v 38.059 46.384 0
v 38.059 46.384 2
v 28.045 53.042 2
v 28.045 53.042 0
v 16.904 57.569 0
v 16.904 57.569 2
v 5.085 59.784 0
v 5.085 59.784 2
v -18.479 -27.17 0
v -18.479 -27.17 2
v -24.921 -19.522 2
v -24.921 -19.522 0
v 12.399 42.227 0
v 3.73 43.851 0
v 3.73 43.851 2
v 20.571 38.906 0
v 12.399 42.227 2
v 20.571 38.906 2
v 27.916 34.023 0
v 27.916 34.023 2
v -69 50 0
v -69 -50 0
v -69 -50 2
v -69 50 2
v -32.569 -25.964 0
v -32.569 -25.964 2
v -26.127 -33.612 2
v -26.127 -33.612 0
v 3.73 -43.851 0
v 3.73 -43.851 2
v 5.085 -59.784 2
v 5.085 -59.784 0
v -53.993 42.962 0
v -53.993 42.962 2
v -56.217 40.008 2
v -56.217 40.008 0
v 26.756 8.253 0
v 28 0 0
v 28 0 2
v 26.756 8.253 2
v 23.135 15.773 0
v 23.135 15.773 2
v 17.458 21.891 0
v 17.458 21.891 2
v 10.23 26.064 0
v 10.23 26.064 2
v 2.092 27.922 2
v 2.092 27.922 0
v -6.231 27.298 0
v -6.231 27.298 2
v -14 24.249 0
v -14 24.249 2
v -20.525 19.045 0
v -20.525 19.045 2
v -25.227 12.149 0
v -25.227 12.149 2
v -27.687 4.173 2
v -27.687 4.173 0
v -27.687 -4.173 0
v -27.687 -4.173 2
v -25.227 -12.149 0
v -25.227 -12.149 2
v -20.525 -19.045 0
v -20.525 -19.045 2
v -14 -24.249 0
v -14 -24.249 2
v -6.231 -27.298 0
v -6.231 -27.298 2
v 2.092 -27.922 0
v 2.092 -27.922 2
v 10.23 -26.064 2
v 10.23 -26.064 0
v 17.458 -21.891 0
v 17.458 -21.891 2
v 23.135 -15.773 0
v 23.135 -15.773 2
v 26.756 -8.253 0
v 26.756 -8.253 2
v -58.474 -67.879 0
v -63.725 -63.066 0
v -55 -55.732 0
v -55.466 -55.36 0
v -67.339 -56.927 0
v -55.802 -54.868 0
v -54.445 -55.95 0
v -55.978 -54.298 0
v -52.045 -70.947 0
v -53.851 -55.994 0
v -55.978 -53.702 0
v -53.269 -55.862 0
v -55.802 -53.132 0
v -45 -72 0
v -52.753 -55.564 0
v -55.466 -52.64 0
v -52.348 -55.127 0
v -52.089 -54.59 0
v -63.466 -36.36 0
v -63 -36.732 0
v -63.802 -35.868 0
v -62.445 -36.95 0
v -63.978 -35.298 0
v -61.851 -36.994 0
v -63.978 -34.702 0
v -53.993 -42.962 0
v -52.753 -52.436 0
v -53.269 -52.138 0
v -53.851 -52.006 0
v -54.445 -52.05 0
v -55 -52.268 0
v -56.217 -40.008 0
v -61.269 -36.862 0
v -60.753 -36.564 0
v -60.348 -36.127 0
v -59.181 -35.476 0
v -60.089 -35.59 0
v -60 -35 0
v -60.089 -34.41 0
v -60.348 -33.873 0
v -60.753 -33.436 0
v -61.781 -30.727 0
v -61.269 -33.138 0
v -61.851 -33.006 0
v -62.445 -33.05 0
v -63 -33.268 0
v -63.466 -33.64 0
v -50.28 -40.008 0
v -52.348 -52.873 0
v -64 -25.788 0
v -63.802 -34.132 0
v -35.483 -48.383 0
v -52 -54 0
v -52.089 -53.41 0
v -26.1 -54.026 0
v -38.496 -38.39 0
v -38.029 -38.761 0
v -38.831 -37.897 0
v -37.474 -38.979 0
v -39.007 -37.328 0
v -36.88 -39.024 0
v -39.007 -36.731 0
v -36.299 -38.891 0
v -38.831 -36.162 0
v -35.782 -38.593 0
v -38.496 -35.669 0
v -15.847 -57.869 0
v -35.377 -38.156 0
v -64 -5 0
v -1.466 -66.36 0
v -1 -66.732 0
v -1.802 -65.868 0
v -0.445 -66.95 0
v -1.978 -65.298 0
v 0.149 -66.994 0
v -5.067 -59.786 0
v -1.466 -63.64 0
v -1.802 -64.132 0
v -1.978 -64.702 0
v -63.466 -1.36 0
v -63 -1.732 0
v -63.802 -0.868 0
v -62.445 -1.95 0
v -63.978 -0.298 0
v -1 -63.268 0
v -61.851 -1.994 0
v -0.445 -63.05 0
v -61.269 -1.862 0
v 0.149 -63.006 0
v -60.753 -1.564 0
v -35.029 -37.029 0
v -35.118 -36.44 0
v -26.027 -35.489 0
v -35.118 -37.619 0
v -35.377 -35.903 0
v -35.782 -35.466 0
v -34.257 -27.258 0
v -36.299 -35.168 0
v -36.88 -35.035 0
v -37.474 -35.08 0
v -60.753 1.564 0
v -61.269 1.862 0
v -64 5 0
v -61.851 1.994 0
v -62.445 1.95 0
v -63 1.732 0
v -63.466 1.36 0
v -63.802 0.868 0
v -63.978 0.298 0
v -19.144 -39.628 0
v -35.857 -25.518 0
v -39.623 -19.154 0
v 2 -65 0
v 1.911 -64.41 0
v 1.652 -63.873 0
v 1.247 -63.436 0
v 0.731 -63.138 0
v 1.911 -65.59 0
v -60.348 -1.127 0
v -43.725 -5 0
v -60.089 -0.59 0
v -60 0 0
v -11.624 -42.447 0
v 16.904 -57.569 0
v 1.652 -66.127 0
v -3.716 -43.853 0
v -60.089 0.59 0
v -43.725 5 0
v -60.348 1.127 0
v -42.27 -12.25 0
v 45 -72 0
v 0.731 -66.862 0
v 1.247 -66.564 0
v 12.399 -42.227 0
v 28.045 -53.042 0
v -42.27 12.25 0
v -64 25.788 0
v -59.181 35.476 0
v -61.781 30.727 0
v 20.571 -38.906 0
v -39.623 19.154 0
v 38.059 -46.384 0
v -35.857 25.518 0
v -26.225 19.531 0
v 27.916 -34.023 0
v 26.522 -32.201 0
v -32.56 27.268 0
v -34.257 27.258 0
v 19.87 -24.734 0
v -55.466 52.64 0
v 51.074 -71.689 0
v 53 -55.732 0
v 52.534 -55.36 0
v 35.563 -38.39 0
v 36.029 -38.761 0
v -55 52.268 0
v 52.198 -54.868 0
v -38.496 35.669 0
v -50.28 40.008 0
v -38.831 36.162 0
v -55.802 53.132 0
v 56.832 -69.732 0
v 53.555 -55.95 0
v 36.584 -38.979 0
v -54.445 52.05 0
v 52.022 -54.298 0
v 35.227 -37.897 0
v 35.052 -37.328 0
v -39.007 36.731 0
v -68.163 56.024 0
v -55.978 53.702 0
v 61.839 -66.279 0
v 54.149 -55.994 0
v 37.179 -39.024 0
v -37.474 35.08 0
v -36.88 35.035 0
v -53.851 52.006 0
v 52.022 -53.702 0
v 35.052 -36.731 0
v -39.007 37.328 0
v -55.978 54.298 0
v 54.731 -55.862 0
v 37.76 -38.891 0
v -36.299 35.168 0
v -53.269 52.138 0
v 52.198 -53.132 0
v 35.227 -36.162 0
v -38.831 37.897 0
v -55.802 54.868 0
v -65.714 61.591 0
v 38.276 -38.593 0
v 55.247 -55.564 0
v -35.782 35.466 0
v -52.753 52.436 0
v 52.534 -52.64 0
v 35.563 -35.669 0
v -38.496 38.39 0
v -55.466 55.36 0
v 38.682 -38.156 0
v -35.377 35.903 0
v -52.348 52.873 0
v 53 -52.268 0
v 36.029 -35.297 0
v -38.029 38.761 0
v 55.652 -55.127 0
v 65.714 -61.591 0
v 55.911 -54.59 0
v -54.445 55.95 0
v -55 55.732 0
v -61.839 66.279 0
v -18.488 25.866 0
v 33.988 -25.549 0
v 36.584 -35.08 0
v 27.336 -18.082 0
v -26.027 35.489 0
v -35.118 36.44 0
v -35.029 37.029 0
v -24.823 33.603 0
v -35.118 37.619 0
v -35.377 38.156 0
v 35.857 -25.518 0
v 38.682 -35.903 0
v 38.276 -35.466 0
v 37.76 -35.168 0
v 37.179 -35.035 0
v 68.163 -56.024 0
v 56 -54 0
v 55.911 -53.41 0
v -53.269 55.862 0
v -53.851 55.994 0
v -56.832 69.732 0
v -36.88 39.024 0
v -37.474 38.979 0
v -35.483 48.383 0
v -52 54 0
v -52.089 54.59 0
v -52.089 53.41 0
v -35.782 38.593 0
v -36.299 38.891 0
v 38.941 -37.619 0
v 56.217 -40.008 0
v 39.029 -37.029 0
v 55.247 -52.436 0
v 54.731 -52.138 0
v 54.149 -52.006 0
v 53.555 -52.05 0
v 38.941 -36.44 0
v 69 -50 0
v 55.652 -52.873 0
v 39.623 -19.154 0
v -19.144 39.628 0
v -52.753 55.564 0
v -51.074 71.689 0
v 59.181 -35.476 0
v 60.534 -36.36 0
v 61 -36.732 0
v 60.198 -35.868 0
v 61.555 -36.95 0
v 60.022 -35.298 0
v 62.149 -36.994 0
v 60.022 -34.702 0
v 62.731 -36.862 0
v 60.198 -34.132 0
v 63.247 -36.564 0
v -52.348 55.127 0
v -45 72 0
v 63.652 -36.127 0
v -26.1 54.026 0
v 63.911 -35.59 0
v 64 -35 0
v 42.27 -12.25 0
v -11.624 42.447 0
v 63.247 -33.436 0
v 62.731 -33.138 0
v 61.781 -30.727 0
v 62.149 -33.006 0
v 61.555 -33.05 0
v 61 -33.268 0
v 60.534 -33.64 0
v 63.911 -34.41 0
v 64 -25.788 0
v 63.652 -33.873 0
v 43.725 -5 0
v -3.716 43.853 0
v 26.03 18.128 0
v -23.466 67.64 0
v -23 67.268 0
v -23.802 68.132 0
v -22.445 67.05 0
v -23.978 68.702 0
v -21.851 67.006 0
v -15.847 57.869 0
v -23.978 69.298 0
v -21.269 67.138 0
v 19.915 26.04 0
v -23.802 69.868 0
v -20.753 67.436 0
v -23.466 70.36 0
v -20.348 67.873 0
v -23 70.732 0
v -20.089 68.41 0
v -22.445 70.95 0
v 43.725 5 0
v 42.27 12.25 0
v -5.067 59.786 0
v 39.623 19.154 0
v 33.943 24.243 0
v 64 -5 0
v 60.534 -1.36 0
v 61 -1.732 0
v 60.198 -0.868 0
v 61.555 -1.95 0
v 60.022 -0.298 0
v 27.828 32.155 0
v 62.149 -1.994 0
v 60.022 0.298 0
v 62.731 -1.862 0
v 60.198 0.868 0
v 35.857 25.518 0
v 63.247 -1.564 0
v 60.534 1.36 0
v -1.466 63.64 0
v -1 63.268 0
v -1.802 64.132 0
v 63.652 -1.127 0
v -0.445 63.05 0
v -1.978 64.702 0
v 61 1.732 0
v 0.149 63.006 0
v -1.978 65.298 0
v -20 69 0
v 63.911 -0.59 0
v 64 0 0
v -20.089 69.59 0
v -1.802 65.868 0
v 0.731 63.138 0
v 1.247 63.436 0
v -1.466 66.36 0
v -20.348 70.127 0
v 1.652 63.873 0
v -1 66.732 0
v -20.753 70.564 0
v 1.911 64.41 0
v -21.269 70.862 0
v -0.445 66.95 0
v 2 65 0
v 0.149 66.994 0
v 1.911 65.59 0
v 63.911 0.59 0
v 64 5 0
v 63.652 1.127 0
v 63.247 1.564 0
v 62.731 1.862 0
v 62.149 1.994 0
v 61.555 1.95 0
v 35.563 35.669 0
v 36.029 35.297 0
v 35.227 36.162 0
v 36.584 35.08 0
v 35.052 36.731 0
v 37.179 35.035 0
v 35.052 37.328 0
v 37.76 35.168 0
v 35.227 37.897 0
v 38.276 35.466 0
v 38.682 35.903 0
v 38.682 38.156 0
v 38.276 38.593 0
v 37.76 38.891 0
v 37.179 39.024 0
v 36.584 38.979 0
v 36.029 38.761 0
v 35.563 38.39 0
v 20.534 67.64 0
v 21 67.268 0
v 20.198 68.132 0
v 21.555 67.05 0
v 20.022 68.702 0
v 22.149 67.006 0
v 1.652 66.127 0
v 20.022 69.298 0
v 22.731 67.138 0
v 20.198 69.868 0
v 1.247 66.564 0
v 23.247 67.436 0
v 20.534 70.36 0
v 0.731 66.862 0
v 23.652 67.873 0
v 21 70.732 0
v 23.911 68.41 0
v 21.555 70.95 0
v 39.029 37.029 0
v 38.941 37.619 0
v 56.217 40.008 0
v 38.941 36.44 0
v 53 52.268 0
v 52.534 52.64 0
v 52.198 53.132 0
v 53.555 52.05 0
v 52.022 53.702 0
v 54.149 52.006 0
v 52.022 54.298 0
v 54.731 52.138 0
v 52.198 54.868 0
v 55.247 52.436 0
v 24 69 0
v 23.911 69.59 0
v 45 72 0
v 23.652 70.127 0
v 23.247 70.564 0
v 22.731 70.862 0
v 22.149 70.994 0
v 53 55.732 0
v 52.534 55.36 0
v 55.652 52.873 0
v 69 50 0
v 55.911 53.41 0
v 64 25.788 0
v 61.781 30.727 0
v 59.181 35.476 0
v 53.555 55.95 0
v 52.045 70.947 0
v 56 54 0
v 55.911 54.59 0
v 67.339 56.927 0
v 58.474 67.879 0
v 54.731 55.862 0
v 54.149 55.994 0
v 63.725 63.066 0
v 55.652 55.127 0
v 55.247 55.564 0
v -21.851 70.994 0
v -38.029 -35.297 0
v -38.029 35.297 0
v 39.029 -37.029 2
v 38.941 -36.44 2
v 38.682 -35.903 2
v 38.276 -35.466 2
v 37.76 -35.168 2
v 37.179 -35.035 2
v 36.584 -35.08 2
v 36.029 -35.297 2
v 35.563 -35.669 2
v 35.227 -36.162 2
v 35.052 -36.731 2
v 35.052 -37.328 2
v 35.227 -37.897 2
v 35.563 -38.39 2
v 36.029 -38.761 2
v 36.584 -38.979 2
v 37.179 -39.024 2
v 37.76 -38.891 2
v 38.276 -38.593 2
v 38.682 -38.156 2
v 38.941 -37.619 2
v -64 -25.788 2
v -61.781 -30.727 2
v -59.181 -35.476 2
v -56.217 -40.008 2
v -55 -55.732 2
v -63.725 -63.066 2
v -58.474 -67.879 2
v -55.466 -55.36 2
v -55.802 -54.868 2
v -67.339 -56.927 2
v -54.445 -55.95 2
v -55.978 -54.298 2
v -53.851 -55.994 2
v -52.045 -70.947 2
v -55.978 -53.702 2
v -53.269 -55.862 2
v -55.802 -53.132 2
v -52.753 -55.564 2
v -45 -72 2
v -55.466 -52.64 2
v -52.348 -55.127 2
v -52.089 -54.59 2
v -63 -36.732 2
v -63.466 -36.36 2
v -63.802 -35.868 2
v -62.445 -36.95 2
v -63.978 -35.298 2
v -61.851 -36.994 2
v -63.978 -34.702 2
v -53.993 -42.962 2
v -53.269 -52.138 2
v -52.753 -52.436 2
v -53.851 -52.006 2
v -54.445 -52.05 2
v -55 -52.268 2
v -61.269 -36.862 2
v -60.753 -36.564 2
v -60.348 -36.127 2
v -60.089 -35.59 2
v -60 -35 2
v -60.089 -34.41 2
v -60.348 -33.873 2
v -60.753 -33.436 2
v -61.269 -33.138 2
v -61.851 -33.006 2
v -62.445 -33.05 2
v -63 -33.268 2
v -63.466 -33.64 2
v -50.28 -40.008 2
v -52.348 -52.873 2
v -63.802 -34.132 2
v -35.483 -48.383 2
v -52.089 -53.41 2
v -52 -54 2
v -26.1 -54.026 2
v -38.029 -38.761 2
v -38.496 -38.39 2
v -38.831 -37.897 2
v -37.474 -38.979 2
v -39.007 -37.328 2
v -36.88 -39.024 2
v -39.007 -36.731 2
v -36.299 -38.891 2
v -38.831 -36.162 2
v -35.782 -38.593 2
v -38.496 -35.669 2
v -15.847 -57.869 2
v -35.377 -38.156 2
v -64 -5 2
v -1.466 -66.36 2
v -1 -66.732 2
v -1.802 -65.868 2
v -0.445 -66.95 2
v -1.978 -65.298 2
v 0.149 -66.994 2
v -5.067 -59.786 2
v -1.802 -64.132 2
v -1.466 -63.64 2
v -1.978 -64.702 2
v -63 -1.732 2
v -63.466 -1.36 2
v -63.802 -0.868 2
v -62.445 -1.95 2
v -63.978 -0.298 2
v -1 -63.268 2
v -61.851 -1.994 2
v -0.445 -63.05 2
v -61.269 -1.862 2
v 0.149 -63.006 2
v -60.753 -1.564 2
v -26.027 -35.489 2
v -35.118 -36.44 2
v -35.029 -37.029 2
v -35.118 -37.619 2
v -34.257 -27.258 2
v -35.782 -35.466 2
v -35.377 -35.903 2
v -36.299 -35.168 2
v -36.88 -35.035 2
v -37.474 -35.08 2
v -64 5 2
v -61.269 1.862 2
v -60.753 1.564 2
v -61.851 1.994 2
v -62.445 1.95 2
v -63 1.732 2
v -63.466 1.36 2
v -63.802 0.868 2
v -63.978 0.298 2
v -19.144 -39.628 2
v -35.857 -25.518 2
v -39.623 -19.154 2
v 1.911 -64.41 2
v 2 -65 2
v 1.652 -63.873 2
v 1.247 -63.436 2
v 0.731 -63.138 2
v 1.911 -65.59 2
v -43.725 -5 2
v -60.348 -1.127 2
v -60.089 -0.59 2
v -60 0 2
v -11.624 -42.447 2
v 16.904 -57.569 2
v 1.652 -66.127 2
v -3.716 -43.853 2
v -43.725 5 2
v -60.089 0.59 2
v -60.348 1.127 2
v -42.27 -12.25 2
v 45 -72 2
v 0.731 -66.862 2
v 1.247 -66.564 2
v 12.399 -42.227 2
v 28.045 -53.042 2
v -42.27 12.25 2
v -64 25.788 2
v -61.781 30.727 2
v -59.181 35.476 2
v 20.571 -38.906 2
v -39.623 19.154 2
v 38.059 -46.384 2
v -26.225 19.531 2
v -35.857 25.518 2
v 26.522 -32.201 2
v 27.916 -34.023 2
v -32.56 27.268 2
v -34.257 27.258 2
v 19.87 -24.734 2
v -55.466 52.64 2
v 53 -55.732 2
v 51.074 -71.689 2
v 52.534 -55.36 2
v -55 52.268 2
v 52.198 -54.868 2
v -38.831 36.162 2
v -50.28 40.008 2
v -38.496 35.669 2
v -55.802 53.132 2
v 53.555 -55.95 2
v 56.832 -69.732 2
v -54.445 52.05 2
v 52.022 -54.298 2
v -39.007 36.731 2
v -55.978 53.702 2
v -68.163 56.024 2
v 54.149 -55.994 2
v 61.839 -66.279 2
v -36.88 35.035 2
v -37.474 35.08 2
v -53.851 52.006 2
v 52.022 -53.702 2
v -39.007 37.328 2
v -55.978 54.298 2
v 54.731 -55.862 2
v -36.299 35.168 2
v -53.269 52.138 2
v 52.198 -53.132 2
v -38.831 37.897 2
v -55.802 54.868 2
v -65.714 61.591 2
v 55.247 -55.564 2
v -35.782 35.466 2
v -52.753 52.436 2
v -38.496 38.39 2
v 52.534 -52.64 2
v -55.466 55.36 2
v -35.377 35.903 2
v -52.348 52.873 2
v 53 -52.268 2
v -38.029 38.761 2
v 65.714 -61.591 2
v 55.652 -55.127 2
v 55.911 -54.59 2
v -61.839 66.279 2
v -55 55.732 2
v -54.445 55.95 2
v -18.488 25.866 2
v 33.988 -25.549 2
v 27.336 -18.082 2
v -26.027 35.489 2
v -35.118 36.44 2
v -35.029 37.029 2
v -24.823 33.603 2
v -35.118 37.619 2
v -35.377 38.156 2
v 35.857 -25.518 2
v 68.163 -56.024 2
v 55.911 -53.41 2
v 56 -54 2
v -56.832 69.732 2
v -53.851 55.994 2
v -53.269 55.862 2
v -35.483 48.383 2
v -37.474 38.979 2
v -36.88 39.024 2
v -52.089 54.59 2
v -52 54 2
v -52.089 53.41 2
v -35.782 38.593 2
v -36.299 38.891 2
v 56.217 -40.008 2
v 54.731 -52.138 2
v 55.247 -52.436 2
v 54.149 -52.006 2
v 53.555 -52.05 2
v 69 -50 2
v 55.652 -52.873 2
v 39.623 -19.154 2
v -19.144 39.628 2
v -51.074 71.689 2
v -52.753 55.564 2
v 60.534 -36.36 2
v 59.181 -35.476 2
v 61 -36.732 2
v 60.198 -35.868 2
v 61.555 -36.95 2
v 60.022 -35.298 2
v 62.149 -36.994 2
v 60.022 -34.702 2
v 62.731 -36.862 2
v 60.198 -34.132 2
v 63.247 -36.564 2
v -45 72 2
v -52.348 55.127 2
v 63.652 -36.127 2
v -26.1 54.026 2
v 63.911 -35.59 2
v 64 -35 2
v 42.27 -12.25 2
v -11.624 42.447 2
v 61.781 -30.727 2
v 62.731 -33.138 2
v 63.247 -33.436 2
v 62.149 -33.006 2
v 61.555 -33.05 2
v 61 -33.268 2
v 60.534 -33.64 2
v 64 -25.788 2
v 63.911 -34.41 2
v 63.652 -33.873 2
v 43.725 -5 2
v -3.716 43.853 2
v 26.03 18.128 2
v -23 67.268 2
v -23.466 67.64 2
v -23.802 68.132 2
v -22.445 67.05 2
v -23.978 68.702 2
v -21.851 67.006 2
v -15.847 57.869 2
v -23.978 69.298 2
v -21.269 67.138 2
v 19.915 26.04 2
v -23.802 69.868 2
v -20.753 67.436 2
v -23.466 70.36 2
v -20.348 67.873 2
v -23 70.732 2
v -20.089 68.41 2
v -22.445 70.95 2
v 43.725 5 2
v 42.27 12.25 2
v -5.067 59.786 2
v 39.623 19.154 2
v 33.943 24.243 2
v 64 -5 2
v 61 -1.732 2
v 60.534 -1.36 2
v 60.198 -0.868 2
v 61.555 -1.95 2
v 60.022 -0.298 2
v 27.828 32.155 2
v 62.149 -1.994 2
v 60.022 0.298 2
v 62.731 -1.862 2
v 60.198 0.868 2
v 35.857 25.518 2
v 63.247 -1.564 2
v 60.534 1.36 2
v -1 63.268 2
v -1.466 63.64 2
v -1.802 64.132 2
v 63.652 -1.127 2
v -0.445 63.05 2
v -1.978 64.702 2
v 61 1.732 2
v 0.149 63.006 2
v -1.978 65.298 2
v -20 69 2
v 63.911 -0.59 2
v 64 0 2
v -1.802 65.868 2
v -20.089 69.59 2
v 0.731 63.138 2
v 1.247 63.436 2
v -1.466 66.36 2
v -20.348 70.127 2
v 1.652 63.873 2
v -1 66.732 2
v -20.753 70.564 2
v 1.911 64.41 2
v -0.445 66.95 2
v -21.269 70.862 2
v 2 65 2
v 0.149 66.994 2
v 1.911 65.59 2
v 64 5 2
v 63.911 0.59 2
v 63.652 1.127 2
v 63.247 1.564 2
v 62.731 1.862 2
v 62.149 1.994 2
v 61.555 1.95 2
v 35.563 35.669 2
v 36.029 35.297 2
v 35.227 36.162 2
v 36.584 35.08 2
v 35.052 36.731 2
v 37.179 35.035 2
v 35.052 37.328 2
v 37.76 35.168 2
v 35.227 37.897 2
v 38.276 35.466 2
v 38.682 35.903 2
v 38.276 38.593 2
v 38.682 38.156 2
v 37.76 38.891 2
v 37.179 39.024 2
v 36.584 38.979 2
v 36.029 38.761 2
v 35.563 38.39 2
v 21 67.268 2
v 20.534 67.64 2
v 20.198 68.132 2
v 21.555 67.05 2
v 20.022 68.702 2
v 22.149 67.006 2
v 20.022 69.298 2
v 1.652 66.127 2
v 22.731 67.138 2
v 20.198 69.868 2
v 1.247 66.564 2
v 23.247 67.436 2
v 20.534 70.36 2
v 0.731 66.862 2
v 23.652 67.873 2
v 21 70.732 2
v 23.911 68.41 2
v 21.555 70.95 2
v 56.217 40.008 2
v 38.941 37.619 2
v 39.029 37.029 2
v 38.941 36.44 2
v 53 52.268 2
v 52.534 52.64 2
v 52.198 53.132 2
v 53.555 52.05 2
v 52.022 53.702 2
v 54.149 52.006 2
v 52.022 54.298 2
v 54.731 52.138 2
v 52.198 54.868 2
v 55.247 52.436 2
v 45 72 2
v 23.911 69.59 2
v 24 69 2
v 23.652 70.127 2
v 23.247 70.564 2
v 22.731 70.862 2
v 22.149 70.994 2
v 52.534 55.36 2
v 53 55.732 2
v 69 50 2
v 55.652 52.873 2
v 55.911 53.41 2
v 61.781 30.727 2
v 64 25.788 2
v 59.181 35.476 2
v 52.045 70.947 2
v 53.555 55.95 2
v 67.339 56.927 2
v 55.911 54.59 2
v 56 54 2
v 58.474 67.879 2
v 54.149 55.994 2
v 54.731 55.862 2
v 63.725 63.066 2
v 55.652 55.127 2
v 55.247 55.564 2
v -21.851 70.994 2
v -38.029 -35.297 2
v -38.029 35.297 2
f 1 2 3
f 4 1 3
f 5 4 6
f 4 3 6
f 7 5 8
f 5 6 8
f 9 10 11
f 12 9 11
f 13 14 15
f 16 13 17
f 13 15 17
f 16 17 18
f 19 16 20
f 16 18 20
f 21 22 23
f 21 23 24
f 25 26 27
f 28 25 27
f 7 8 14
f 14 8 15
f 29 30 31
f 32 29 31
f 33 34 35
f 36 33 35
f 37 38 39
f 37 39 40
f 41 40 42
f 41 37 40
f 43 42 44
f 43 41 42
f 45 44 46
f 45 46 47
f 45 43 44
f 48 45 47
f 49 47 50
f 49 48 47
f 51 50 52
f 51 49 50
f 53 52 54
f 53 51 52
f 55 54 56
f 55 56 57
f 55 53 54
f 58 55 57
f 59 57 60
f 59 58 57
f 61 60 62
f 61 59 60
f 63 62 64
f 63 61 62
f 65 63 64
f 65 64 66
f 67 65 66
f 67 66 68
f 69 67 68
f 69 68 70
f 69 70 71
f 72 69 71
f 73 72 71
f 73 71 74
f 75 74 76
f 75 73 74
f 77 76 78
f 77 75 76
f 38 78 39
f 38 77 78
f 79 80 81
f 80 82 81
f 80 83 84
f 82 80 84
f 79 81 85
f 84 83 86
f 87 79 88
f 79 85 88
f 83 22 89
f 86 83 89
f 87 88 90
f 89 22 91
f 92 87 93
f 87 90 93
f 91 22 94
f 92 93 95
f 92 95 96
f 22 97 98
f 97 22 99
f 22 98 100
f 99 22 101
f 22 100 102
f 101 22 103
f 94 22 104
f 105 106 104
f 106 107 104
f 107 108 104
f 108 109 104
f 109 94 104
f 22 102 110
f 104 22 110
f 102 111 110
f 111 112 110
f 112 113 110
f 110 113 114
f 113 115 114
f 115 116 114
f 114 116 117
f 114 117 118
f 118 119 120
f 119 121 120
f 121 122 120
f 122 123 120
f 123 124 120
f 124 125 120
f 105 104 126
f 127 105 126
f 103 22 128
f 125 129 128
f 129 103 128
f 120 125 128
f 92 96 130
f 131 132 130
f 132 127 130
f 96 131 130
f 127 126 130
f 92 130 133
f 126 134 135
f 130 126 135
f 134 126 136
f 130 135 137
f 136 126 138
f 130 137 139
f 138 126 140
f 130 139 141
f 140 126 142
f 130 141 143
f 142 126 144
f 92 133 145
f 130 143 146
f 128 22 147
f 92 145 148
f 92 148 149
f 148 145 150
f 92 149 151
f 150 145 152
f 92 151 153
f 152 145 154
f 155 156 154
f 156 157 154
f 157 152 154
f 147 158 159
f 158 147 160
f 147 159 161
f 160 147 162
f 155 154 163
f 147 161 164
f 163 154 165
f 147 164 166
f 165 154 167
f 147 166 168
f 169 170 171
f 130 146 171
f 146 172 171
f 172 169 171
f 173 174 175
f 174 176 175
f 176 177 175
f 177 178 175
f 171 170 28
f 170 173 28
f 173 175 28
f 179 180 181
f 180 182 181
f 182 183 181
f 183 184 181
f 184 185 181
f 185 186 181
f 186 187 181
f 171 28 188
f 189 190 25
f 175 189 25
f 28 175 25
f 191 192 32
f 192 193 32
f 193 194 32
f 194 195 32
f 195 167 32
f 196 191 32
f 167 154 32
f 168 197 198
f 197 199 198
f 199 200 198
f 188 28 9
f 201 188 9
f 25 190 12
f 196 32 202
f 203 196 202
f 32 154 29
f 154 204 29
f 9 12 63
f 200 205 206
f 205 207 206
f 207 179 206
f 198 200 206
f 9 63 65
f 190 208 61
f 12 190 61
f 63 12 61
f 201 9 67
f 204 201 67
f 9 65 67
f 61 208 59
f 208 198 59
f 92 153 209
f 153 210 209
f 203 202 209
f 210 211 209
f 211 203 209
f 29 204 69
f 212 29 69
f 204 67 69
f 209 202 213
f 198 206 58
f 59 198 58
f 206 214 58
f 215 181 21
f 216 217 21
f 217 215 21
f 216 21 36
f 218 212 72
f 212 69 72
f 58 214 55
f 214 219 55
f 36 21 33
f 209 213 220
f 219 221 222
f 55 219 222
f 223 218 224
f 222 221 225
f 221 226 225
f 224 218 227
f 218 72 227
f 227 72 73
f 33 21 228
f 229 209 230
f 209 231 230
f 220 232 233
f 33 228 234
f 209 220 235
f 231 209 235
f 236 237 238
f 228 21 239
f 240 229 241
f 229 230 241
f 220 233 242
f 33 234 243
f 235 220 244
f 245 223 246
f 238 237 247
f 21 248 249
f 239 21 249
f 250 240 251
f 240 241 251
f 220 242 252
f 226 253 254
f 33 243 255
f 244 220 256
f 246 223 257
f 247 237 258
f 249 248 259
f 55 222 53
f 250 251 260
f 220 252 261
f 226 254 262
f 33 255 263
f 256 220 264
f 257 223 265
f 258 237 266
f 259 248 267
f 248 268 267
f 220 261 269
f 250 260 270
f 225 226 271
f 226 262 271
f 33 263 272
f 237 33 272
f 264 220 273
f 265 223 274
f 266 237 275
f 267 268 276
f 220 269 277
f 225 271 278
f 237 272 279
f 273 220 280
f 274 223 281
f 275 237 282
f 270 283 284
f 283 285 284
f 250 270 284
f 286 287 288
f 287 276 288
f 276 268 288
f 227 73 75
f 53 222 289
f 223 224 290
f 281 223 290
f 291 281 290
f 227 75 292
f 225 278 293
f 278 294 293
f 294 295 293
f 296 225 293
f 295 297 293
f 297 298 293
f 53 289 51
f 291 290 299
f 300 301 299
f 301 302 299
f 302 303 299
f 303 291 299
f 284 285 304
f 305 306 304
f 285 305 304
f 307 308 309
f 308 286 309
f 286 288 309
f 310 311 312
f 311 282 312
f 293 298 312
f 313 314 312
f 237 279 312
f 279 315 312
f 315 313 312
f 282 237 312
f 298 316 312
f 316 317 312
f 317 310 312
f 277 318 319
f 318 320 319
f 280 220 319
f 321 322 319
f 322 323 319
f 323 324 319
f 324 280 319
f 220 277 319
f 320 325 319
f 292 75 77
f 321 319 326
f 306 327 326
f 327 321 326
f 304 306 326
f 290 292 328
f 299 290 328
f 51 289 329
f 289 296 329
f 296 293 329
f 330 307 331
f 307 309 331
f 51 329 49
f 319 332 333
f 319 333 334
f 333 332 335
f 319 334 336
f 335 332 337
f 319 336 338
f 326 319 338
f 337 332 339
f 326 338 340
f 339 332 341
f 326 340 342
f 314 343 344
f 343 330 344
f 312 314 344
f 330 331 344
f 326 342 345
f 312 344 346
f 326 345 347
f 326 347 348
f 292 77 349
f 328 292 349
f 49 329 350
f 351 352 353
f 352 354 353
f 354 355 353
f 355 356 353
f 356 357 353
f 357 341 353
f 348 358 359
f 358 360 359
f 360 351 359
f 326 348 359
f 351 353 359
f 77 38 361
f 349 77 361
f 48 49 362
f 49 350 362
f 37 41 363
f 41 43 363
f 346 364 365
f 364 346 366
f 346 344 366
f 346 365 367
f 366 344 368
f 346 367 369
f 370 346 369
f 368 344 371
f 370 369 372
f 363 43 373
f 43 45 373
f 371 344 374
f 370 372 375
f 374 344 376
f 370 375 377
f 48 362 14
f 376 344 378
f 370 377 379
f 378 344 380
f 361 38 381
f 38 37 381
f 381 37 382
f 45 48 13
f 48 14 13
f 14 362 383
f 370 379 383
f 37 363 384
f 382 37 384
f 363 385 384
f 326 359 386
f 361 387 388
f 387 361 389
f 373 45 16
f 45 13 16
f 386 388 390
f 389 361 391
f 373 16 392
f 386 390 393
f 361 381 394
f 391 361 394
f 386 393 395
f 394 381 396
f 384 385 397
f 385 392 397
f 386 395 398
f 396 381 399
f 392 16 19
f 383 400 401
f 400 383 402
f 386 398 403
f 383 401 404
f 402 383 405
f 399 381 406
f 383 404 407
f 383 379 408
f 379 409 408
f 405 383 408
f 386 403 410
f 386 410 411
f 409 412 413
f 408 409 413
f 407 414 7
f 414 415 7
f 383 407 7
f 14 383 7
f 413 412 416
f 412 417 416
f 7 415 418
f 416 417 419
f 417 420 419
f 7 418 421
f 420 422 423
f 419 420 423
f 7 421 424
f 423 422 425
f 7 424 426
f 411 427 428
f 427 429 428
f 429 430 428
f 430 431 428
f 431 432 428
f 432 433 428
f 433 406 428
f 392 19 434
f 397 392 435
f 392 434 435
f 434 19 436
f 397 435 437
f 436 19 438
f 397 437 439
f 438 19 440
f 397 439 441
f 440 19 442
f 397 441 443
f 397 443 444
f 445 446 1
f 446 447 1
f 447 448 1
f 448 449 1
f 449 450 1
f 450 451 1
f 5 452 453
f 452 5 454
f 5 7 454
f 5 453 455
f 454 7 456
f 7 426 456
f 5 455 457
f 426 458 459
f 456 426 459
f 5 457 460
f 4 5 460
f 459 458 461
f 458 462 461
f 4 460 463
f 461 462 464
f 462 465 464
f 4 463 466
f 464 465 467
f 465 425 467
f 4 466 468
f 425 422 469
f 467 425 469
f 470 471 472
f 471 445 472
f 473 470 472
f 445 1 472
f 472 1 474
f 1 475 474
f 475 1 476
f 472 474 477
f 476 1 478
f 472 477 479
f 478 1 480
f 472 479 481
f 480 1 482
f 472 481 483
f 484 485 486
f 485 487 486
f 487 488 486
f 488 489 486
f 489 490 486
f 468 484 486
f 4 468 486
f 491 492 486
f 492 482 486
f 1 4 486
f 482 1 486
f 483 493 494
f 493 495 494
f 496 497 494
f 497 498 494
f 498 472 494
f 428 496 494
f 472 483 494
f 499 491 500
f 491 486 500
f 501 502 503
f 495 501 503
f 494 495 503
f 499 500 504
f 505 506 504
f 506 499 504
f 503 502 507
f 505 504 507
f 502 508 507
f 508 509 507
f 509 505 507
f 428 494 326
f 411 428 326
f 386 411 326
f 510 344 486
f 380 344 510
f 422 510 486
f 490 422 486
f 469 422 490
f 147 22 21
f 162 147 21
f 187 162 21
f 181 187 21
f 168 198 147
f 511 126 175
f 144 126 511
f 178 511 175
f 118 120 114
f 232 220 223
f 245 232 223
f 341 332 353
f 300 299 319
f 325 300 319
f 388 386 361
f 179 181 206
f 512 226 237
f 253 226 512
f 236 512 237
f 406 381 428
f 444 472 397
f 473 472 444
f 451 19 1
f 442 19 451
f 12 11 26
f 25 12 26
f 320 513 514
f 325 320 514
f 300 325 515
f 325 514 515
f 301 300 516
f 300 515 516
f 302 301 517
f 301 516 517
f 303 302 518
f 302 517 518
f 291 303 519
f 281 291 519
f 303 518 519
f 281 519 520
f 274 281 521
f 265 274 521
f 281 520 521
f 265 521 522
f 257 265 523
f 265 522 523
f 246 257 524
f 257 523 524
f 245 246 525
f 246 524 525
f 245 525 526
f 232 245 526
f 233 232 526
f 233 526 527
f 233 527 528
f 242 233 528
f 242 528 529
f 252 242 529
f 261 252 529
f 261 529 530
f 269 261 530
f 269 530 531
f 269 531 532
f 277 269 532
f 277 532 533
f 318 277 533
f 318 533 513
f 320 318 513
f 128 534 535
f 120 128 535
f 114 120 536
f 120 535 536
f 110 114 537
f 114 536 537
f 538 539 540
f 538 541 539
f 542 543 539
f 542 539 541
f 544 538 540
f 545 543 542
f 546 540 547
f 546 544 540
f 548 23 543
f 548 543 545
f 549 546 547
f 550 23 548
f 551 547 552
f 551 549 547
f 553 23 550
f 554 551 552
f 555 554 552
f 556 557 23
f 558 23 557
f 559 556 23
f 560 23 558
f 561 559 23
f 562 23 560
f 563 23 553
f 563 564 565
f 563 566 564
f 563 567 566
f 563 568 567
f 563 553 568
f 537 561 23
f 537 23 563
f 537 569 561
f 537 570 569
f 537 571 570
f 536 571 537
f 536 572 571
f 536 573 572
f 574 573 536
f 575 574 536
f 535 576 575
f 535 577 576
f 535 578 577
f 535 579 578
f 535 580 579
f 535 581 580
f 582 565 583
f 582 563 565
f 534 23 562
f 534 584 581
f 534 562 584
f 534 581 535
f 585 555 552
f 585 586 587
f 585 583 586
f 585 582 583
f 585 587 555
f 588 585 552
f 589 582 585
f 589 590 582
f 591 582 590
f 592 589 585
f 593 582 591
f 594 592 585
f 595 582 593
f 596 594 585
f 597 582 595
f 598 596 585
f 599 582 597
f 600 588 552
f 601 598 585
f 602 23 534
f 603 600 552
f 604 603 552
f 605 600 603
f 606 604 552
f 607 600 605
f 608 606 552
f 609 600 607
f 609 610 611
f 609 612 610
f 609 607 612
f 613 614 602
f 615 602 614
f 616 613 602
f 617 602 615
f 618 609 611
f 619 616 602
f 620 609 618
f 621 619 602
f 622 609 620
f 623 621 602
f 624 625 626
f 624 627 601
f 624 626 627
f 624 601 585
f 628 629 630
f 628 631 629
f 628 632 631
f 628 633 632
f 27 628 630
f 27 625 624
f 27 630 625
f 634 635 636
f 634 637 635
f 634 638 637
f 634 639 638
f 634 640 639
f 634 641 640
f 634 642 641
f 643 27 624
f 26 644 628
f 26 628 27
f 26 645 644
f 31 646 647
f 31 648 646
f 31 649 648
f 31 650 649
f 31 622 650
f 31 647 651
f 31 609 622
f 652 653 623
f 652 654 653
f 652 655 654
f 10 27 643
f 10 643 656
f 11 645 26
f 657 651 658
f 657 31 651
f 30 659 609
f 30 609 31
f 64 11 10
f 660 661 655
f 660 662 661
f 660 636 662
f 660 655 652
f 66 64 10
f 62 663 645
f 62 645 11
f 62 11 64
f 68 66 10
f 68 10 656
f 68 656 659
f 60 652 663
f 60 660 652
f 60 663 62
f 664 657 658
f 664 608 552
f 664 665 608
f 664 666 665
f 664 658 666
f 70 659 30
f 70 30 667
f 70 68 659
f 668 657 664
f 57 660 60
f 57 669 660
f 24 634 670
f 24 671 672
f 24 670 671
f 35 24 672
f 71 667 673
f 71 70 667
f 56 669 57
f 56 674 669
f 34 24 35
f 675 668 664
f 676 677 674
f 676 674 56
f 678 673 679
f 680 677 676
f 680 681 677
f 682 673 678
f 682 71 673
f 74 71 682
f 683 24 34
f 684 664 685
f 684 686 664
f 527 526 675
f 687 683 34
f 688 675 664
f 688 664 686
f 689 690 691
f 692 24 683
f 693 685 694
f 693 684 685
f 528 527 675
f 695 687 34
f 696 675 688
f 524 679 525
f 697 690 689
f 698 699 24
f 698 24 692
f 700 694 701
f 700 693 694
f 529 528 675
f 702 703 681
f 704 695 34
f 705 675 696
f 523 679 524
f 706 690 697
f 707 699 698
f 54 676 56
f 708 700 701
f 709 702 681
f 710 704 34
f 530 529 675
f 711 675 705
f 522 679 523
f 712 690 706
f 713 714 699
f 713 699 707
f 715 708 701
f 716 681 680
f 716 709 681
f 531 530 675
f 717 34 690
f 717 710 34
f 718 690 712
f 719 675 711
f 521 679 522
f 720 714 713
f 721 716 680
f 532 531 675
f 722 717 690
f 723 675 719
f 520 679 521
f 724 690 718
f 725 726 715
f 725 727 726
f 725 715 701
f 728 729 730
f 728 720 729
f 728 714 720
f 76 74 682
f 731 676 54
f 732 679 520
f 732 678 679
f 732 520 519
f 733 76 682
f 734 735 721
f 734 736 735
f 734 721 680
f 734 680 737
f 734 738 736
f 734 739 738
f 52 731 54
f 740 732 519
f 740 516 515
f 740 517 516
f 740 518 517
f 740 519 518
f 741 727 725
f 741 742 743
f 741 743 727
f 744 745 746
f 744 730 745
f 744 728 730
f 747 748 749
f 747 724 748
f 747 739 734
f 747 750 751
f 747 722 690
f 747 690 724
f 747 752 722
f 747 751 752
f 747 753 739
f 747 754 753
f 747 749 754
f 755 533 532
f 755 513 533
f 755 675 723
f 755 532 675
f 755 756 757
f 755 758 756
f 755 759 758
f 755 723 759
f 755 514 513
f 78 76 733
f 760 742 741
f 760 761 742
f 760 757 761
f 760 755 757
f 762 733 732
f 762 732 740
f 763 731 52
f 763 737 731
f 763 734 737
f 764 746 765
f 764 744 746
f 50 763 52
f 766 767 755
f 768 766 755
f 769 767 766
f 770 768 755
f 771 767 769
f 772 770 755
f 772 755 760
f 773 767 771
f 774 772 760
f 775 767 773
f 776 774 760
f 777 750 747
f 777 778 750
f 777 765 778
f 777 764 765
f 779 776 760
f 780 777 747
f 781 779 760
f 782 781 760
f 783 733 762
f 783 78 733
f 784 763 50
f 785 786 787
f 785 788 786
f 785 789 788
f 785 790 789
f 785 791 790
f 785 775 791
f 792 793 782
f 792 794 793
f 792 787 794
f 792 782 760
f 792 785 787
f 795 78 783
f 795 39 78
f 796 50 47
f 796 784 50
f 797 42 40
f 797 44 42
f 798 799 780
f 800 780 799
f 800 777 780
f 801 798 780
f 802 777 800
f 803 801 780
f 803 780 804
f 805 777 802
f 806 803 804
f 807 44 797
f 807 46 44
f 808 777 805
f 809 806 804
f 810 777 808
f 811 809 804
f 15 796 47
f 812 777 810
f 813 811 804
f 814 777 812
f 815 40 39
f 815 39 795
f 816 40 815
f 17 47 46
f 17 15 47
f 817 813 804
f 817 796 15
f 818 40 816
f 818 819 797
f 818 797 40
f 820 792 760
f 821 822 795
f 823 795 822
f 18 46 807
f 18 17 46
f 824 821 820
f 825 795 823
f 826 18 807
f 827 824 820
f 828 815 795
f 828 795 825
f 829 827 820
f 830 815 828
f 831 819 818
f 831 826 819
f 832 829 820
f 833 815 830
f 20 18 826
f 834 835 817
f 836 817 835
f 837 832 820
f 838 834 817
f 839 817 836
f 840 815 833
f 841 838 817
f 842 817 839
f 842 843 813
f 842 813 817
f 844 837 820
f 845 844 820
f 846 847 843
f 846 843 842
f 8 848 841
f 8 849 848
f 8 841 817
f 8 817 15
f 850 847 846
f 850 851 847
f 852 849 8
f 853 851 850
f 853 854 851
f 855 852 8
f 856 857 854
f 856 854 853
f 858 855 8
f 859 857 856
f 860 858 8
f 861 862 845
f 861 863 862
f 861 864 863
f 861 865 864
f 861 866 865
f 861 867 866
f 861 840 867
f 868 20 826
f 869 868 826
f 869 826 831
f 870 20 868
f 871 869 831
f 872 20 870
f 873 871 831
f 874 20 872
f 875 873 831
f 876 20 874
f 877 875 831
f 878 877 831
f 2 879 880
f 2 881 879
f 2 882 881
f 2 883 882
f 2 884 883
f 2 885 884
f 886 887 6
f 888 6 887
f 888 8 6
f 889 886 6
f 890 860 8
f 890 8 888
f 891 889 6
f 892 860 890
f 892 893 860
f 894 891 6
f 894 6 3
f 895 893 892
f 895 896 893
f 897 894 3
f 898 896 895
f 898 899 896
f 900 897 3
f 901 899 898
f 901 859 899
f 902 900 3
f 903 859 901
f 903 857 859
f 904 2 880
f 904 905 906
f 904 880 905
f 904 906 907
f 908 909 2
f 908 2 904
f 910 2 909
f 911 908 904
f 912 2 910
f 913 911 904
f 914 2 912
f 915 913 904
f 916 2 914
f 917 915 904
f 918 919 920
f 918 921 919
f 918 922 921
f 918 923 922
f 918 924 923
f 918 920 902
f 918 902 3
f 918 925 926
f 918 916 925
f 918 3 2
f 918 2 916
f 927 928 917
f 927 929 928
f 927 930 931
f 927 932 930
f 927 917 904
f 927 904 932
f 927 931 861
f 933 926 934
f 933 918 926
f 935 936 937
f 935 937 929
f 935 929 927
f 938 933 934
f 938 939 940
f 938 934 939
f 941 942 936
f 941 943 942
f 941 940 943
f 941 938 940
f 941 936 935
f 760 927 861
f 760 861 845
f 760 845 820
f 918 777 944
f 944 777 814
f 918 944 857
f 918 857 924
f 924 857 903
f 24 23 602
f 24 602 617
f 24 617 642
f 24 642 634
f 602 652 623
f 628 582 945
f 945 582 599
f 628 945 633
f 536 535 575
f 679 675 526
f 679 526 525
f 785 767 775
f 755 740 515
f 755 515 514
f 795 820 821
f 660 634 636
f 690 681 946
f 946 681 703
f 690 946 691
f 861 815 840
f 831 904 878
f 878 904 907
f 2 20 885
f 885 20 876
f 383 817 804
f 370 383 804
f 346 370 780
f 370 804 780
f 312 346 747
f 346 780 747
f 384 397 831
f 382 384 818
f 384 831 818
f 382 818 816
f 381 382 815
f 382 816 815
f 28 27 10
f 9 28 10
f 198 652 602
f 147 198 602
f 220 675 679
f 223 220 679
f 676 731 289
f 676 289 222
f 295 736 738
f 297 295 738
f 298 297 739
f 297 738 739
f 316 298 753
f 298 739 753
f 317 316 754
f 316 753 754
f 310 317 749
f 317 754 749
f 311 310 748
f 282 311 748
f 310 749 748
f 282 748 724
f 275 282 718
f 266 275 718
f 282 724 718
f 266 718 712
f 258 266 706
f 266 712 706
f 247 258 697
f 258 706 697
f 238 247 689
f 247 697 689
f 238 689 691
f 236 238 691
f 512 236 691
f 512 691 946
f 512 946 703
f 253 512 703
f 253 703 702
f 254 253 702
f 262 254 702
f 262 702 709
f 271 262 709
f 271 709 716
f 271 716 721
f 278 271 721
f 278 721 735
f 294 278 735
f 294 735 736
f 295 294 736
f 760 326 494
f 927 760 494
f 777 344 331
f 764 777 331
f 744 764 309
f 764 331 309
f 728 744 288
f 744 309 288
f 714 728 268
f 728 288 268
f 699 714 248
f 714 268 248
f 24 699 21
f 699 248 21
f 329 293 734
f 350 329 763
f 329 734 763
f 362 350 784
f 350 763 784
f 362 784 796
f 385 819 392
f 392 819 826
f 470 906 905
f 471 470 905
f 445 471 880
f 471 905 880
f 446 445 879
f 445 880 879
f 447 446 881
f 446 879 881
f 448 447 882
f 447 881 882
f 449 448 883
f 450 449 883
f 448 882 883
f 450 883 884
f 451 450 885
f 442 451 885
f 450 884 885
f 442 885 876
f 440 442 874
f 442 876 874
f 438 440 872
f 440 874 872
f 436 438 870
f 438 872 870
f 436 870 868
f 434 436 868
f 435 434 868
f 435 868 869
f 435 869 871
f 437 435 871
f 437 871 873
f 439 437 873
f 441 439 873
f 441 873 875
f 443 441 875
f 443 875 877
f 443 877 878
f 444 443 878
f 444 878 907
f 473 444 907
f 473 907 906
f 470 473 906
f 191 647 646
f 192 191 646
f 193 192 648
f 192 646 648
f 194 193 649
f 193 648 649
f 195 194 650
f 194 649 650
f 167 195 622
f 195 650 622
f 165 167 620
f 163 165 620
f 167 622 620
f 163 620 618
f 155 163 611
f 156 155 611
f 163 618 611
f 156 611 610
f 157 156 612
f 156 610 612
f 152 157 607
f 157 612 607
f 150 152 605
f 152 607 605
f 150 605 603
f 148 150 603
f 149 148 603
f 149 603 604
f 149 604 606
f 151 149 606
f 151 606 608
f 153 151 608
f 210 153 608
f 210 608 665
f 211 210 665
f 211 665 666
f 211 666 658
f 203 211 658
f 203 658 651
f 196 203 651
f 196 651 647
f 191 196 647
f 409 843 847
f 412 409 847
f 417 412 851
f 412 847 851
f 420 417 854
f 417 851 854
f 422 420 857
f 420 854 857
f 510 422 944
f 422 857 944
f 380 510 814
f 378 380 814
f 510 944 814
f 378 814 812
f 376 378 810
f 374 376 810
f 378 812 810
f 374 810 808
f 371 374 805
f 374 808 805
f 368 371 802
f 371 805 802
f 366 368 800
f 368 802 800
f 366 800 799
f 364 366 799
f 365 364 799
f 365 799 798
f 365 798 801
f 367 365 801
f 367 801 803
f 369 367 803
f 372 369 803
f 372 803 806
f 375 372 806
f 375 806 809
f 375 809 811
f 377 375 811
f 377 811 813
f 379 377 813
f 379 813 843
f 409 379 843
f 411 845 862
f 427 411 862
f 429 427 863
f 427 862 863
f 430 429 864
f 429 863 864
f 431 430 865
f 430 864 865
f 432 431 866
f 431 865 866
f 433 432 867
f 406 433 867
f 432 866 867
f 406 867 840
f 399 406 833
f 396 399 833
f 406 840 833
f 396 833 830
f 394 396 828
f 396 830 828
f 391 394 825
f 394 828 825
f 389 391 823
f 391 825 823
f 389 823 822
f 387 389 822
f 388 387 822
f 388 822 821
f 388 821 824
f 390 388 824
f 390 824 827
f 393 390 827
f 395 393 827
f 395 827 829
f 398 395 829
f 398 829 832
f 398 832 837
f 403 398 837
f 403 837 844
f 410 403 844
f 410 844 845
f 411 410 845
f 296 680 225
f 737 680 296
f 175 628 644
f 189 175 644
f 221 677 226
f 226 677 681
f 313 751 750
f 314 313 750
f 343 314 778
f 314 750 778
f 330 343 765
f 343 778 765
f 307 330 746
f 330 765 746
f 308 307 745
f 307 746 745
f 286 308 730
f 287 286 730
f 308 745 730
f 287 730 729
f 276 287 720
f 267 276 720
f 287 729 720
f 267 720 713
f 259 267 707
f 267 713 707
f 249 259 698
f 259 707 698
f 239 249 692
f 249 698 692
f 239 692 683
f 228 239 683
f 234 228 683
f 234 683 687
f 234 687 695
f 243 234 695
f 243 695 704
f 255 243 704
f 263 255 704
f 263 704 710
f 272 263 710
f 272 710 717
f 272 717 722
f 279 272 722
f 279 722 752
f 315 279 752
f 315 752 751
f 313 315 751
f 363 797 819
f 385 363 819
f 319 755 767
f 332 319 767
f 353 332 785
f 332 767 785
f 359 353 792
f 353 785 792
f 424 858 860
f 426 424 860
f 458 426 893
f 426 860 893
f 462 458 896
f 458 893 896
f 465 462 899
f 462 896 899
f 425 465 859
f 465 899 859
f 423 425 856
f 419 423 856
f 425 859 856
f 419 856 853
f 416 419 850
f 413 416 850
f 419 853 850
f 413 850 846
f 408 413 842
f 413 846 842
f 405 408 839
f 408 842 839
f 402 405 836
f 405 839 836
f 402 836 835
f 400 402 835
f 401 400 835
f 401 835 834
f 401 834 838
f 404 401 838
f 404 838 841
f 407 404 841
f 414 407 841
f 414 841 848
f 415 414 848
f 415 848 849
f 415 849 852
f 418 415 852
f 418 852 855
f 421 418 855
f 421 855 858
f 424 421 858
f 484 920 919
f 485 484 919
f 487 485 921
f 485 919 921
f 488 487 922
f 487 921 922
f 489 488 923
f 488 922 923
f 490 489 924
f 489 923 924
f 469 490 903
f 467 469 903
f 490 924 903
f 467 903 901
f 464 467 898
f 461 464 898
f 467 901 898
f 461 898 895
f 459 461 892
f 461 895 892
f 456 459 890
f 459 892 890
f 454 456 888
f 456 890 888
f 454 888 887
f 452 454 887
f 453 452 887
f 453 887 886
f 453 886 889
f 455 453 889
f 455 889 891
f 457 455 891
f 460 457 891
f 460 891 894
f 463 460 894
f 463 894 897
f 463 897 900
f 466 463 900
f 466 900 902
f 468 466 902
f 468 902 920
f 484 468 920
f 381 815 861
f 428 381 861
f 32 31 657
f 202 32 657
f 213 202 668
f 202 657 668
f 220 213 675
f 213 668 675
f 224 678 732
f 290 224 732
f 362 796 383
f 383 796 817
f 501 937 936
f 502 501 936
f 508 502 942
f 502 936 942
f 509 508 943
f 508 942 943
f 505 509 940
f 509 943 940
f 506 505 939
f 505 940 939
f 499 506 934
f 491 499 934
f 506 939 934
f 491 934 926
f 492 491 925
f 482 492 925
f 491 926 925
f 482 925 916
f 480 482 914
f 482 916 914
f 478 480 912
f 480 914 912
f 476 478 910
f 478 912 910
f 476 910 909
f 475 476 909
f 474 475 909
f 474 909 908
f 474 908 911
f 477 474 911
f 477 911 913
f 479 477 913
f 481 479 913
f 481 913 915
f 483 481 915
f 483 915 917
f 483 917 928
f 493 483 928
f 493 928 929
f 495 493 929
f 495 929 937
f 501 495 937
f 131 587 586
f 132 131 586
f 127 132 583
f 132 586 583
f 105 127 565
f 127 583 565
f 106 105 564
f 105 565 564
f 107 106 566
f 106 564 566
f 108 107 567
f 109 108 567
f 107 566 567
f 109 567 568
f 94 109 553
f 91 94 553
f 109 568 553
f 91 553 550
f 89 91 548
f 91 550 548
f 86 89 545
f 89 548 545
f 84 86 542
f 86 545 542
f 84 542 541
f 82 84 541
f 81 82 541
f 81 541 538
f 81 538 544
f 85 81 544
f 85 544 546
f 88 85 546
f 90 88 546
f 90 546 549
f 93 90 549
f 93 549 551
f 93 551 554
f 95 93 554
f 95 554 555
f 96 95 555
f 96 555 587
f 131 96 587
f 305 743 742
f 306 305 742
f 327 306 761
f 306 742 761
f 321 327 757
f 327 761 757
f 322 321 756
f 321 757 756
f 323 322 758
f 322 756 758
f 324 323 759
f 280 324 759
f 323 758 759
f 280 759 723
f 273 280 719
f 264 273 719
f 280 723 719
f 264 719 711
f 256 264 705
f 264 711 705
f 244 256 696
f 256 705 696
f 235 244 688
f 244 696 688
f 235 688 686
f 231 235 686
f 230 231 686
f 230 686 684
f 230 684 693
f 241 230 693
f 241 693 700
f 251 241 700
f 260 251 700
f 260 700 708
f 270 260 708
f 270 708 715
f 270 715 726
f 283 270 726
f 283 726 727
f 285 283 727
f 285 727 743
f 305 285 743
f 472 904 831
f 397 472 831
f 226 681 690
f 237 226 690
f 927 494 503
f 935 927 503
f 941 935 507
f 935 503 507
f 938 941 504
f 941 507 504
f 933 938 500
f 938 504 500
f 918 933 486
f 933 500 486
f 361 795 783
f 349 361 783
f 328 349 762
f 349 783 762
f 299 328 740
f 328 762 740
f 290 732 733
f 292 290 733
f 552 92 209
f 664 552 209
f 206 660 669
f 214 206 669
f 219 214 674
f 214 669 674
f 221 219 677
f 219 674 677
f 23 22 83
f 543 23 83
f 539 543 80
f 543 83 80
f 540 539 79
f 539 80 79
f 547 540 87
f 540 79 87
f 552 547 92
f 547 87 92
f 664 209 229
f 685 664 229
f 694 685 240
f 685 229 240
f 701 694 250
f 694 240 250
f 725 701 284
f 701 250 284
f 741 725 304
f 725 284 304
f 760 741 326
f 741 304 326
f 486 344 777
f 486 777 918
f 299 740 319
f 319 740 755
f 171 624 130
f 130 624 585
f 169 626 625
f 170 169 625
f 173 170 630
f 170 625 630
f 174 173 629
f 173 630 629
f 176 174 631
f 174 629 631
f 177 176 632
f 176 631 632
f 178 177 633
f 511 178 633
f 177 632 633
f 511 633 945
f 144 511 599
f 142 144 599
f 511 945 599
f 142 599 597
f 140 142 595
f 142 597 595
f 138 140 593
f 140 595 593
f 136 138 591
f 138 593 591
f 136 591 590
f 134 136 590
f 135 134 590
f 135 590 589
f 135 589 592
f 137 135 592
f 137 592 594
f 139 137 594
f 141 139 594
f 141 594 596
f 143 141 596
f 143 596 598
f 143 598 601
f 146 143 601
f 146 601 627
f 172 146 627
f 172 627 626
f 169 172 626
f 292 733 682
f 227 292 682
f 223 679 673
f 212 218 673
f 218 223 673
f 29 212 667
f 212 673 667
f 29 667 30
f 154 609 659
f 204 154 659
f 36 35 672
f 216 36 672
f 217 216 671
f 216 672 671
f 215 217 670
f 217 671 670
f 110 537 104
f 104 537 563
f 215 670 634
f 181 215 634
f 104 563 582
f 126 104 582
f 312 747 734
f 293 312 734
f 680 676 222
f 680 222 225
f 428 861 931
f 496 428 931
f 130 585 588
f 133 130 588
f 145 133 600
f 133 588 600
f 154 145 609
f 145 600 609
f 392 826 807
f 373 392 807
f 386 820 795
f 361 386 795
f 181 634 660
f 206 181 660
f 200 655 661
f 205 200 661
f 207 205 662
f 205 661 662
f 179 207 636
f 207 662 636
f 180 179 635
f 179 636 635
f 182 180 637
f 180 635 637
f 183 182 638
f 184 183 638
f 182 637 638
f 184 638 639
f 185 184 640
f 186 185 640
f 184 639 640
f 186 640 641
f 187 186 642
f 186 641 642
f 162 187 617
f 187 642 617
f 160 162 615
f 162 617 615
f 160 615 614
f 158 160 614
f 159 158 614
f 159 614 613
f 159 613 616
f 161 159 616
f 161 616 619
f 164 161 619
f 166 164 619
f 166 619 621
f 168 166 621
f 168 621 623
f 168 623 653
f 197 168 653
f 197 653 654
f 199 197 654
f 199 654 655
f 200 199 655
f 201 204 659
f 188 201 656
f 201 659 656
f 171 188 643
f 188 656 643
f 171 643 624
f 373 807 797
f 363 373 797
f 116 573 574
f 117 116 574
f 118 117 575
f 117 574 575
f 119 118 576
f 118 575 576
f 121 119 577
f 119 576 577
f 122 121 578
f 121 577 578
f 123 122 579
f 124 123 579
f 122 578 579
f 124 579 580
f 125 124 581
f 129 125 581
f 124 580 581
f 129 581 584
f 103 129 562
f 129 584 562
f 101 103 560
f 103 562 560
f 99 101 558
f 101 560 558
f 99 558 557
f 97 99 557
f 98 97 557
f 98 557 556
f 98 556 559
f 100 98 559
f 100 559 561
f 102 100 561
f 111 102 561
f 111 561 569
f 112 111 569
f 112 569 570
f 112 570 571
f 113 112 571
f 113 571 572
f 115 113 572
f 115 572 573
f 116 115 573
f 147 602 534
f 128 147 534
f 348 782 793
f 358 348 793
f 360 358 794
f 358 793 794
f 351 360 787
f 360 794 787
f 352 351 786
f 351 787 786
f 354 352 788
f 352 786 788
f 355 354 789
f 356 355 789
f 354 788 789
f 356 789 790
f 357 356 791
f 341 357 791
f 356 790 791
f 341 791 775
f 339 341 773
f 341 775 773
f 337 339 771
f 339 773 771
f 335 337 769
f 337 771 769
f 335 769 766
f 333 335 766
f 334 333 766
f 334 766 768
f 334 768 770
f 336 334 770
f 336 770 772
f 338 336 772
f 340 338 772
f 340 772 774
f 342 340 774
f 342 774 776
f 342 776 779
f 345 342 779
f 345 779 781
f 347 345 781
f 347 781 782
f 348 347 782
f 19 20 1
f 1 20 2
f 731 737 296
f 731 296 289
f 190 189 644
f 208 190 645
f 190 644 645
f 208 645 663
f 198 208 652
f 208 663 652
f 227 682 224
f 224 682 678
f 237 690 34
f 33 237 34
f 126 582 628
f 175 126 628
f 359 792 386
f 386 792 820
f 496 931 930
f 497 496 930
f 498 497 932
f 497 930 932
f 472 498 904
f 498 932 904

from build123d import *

# Parameters (mm, degrees)
SKETCH1_W           = 90
SKETCH1_H           = 100
SKETCH1_H_2         = 22
SKETCH1_W_2         = 24
BOSS_EXTRUDE1_DEPTH = 2
CUT_EXTRUDE1_DEPTH  = 10
CUT_EXTRUDE2_DEPTH  = 10
SKETCH4_R           = 30
CUT_EXTRUDE3_DEPTH  = 10
CUT_EXTRUDE4_DEPTH  = 10
CUT_EXTRUDE5_DEPTH  = 10
BOSS_EXTRUDE3_START = -2
SKETCH8_R           = 30
SKETCH8_R_2         = 28
BOSS_EXTRUDE3_DEPTH = 2
SKETCH9_R           = 2
CUT_EXTRUDE6_DEPTH  = 10
SKETCH10_R          = 2
BOSS_EXTRUDE4_DEPTH = 2
SKETCH11_R          = 2
CUT_EXTRUDE7_DEPTH  = 10
SKETCH12_R          = 2
BOSS_EXTRUDE5_DEPTH = 2
SKETCH13_R          = 2
CUT_EXTRUDE8_DEPTH  = 5


with BuildPart() as part:
    # Sketch1 → Boss-Extrude1 (new body)
    with BuildSketch(Plane.XY):
        Rectangle(SKETCH1_W, SKETCH1_H)
        with Locations((0, 61)):
            Rectangle(SKETCH1_W, SKETCH1_H_2)
        with Locations((57, 0)):
            Rectangle(SKETCH1_W_2, SKETCH1_H)
        with BuildLine():
            Line((45, 50), (69, 50))
            ThreePointArc((69, 50), (61.278820596, 65.667804287), (45, 72))
            Line((45, 72), (45, 50))
        make_face()
        with BuildLine():
            ThreePointArc((45, -72), (61.83891888, -66.278820596), (69, -50))
            Line((69, -50), (45, -50))
            Line((45, -50), (45, -72))
        make_face()
        with Locations((0, -61)):
            Rectangle(SKETCH1_W, SKETCH1_H_2)
        with BuildLine():
            Line((-45, -72), (-45, -50))
            Line((-45, -50), (-69, -50))
            ThreePointArc((-69, -50), (-61.278820596, -65.667804287), (-45, -72))
        make_face()
        with Locations((-57, 0)):
            Rectangle(SKETCH1_W_2, SKETCH1_H)
        with BuildLine():
            Line((-69, 50), (-45, 50))
            Line((-45, 50), (-45, 72))
            ThreePointArc((-45, 72), (-61.83891888, 66.278820596), (-69, 50))
        make_face()
    extrude(amount=BOSS_EXTRUDE1_DEPTH)

    # Sketch2 → Cut-Extrude1 (cut)
    with BuildSketch(Plane.XY.offset(2)):
        with BuildLine():
            Line((-60.760739313, 25.787593916), (-64, 15.649215929))
            Line((-64, 15.649215929), (-64, 5))
            Line((-64, 5), (-43.724760028, 5))
            ThreePointArc((-43.724760028, 5), (-41.091915324, 15.757827722), (-35.856683042, 25.517698186))
            Line((-35.856683042, 25.517698186), (-56.217391304, 40.007560722))
            ThreePointArc((-56.217391304, 40.007560722), (-60.52773874, 33.126920216), (-64, 25.787593916))
            Line((-64, 25.787593916), (-60.760739313, 25.787593916))
        make_face()
        with BuildLine():
            Line((-64, -5), (-64, -25.787593916))
            ThreePointArc((-64, -25.787593916), (-60.52773874, -33.126920216), (-56.217391304, -40.007560722))
            Line((-56.217391304, -40.007560722), (-35.856683042, -25.517698186))
            ThreePointArc((-35.856683042, -25.517698186), (-41.091915324, -15.757827722), (-43.724760028, -5))
            Line((-43.724760028, -5), (-64, -5))
        make_face()
        with BuildLine():
            Line((-35.483097289, 48.383362913), (-26.026680798, 35.488963441))
            ThreePointArc((-26.026680798, 35.488963441), (-15.448259809, 41.209293956), (-3.716315379, 43.852521472))
            Line((-3.716315379, 43.852521472), (-5.066584601, 59.785698294))
            ThreePointArc((-5.066584601, 59.785698294), (-21.061160661, 56.182092446), (-35.483097289, 48.383362913))
        make_face()
        with BuildLine():
            ThreePointArc((64, 25.787593916), (60.52773874, 33.126920216), (56.217391304, 40.007560722))
            Line((56.217391304, 40.007560722), (35.856683042, 25.517698186))
            ThreePointArc((35.856683042, 25.517698186), (41.091915324, 15.757827722), (43.724760028, 5))
            Line((43.724760028, 5), (64, 5))
            Line((64, 5), (64, 25.787593916))
        make_face()
        with BuildLine():
            Line((-26.026680798, -35.488963441), (-35.483097289, -48.383362913))
            ThreePointArc((-35.483097289, -48.383362913), (-21.061160661, -56.182092446), (-5.066584601, -59.785698294))
            Line((-5.066584601, -59.785698294), (-3.716315379, -43.852521472))
            ThreePointArc((-3.716315379, -43.852521472), (-15.448259809, -41.209293956), (-26.026680798, -35.488963441))
        make_face()
        with BuildLine():
            ThreePointArc((56.217391304, -40.007560722), (60.52773874, -33.126920216), (64, -25.787593916))
            Line((64, -25.787593916), (64, -5))
            Line((64, -5), (43.724760028, -5))
            ThreePointArc((43.724760028, -5), (41.091915324, -15.757827722), (35.856683042, -25.517698186))
            Line((35.856683042, -25.517698186), (56.217391304, -40.007560722))
        make_face()
        with BuildLine():
            Line((27.916279909, 34.022580083), (38.059254795, 46.384190458))
            ThreePointArc((38.059254795, 46.384190458), (22.588514074, 55.585600941), (5.084745763, 59.784156434))
            Line((5.084745763, 59.784156434), (3.729636503, 43.851390526))
            ThreePointArc((3.729636503, 43.851390526), (16.568566174, 40.771770312), (27.916279909, 34.022580083))
        make_face()
        with BuildLine():
            Line((3.729636503, -43.851390526), (5.084745763, -59.784156434))
            ThreePointArc((5.084745763, -59.784156434), (22.588514074, -55.585600941), (38.059254795, -46.384190458))
            Line((38.059254795, -46.384190458), (27.916279909, -34.022580083))
            ThreePointArc((27.916279909, -34.022580083), (16.568566174, -40.771770312), (3.729636503, -43.851390526))
        make_face()
    extrude(amount=-CUT_EXTRUDE1_DEPTH, mode=Mode.SUBTRACT)

    # Sketch3 → Cut-Extrude2 (cut)
    with BuildSketch(Plane.XY.offset(2)):
        Polygon((-64, 25.787593916), (-64, 15.649215929), (-60.760739313, 25.787593916), align=None)
    extrude(amount=-CUT_EXTRUDE2_DEPTH, mode=Mode.SUBTRACT)

    # Sketch4 → Cut-Extrude3 (cut)
    with BuildSketch(Plane(origin=(0, 0, 0), x_dir=(-1, 0, 0), z_dir=(0, 0, -1))):
        Circle(SKETCH4_R)
    extrude(amount=-CUT_EXTRUDE3_DEPTH, mode=Mode.SUBTRACT)

    # Sketch6 → Cut-Extrude4 (cut)
    with BuildSketch(Plane.XY.offset(2)):
        Polygon((-35.856683042, -25.517698186), (-56.217391304, -40.007560722), (-50.280397209, -40.007560722), (-34.257403731, -27.258240508), align=None)
        Polygon((-50.280397209, 40.007560722), (-56.217391304, 40.007560722), (-35.856683042, 25.517698186), (-34.257403731, 27.258240508), align=None)
        Polygon((-50.280397209, -40.007560722), (-56.217391304, -40.007560722), (-53.993303971, -42.96187992), align=None)
        Polygon((-53.993303971, 42.96187992), (-56.217391304, 40.007560722), (-50.280397209, 40.007560722), align=None)
    extrude(amount=-CUT_EXTRUDE4_DEPTH, mode=Mode.SUBTRACT)

    # Sketch7 → Cut-Extrude5 (cut)
    with BuildSketch(Plane.XY.offset(2)):
        Polygon((-32.560271117, 27.267561972), (-24.823321267, 33.603144582), (-18.487738656, 25.866194731), (-26.224688507, 19.530612121), align=None)
        Polygon((27.827762823, 32.155388995), (19.915267174, 26.040455421), (26.030200748, 18.127959772), (33.942696396, 24.242893346), align=None)
        Polygon((33.988304577, -25.549058378), (27.336365779, -18.082351592), (19.869658993, -24.734290389), (26.521597791, -32.200997176), align=None)
        Polygon((-26.126682472, -33.612215797), (-18.478667441, -27.169555937), (-24.921327301, -19.521540905), (-32.569342333, -25.964200766), align=None)
    extrude(amount=-CUT_EXTRUDE5_DEPTH, mode=Mode.SUBTRACT)

    # Sketch8 → Boss-Extrude3 (add)
    with BuildSketch(Plane.XY.offset(2).offset(BOSS_EXTRUDE3_START)):
        Circle(SKETCH8_R)
        Circle(SKETCH8_R_2, mode=Mode.SUBTRACT)
    extrude(amount=BOSS_EXTRUDE3_DEPTH)

    # Sketch9 → Cut-Extrude6 (cut)
    with BuildSketch(Plane.XY.offset(2)):
        with Locations((13, 29.149963044)):
            Circle(SKETCH9_R)
        with Locations((-13, 29.149963044)):
            Circle(SKETCH9_R)
        with Locations((-22, 69)):
            Circle(SKETCH9_R)
        with Locations((22, 69)):
            Circle(SKETCH9_R)
        with Locations((62, -36.850036956)):
            Circle(SKETCH9_R)
        with Locations((-62, -36.850036956)):
            Circle(SKETCH9_R)
        with Locations((0, -36.850036956)):
            Circle(SKETCH9_R)
        with Locations((0, 65)):
            Circle(SKETCH9_R)
        with Locations((62, 0)):
            Circle(SKETCH9_R)
        with Locations((-62, 0)):
            Circle(SKETCH9_R)
        with Locations((0, -65)):
            Circle(SKETCH9_R)
        with Locations((-54, 54)):
            Circle(SKETCH9_R)
        with Locations((54, 54)):
            Circle(SKETCH9_R)
        with Locations((54, -54)):
            Circle(SKETCH9_R)
        with Locations((-54, -54)):
            Circle(SKETCH9_R)
        with Locations((-37.029437252, 37.029437252)):
            Circle(SKETCH9_R)
        with Locations((37.029437252, 37.029437252)):
            Circle(SKETCH9_R)
        with Locations((37.029437252, -37.029437252)):
            Circle(SKETCH9_R)
        with Locations((-37.029437252, -37.029437252)):
            Circle(SKETCH9_R)
    extrude(amount=-CUT_EXTRUDE6_DEPTH, mode=Mode.SUBTRACT)

    # Sketch10 → Boss-Extrude4 (add)
    with BuildSketch(Plane.XY.offset(2)):
        with Locations((62, -36.850036956)):
            Circle(SKETCH10_R)
        with Locations((-62, -36.850036956)):
            Circle(SKETCH10_R)
        with Locations((13, 29.149963044)):
            Circle(SKETCH10_R)
        with Locations((-13, 29.149963044)):
            Circle(SKETCH10_R)
        with Locations((0, -36.850036956)):
            Circle(SKETCH10_R)
    extrude(amount=-BOSS_EXTRUDE4_DEPTH)

    # Sketch11 → Cut-Extrude7 (cut)
    with BuildSketch(Plane.XY.offset(2)):
        with Locations((-62, -36)):
            Circle(SKETCH11_R)
        with Locations((62, -36)):
            Circle(SKETCH11_R)
    extrude(amount=-CUT_EXTRUDE7_DEPTH, mode=Mode.SUBTRACT)

    # Sketch12 → Boss-Extrude5 (add)
    with BuildSketch(Plane.XY.offset(2)):
        with Locations((62, -36)):
            Circle(SKETCH12_R)
        with Locations((-62, -36)):
            Circle(SKETCH12_R)
    extrude(amount=-BOSS_EXTRUDE5_DEPTH)

    # Sketch13 → Cut-Extrude8 (cut)
    with BuildSketch(Plane.XY.offset(2)):
        with Locations((62, -35)):
            Circle(SKETCH13_R)
        with Locations((-62, -35)):
            Circle(SKETCH13_R)
    extrude(amount=-CUT_EXTRUDE8_DEPTH, mode=Mode.SUBTRACT)


solid = part.part
